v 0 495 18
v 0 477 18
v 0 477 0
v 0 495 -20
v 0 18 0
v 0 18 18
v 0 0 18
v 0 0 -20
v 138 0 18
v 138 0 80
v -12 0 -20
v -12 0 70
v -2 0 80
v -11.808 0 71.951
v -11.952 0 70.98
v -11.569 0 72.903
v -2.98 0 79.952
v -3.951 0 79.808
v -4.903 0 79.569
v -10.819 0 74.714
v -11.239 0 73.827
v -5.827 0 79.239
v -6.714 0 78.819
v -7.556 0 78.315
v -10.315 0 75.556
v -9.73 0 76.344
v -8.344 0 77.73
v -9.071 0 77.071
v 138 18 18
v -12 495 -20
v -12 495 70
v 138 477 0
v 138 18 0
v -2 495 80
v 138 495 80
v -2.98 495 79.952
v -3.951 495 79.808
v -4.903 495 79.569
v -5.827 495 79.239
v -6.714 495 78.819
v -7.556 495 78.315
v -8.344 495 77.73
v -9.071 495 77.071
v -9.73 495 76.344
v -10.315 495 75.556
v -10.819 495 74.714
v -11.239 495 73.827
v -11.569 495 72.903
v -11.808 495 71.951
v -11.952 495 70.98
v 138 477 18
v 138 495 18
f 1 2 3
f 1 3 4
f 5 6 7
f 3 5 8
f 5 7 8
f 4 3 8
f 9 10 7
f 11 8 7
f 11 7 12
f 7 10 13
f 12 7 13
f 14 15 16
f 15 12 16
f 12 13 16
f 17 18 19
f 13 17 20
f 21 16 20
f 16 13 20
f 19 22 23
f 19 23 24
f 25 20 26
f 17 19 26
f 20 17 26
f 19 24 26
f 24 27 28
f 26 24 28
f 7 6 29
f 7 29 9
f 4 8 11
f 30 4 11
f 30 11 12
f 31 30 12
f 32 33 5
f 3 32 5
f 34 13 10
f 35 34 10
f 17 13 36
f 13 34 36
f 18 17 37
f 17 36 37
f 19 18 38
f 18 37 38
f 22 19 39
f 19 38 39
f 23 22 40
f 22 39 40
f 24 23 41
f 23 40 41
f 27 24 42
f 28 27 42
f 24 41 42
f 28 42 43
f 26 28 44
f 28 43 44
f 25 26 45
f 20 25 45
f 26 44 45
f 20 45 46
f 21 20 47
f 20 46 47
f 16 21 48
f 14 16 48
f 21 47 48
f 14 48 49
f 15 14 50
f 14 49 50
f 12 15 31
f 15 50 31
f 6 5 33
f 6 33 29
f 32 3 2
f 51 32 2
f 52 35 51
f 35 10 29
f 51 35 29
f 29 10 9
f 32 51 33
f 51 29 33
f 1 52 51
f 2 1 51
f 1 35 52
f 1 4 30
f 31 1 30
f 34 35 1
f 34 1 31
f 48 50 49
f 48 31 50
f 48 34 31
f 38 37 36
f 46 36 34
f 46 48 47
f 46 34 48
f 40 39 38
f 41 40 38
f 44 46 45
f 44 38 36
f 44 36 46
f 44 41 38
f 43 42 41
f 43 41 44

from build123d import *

# Parameters (mm, degrees)
PAD_DEPTH    = 495
SKETCH001_W  = 18
SKETCH001_H  = 18
POCKET_DEPTH = 138
FILLET_R     = 10


with BuildPart() as part:
    # Sketch → Pad (new body)
    with BuildSketch(Plane.XZ):
        Polygon((138, 0), (0, 0), (0, -20), (-12, -20), (-12, 80), (138, 80), align=None)
    extrude(amount=-PAD_DEPTH)

    # Sketch001 (on Face2 of Pad) → Pocket (cut)
    with BuildSketch(Plane(origin=(138, 0, 0), x_dir=(0, 0, 1), z_dir=(1, 0, 0))):
        with Locations((9, -9)):
            Rectangle(SKETCH001_W, SKETCH001_H)
        with Locations((9, -486)):
            Rectangle(SKETCH001_W, SKETCH001_H)
    extrude(amount=-POCKET_DEPTH, mode=Mode.SUBTRACT)

    # Fillet
    fillet_edges = [part.edges().sort_by_distance(p)[0] for p in [
        (-12, 247.5, 80),
    ]]
    fillet(fillet_edges, radius=FILLET_R)


solid = part.part
